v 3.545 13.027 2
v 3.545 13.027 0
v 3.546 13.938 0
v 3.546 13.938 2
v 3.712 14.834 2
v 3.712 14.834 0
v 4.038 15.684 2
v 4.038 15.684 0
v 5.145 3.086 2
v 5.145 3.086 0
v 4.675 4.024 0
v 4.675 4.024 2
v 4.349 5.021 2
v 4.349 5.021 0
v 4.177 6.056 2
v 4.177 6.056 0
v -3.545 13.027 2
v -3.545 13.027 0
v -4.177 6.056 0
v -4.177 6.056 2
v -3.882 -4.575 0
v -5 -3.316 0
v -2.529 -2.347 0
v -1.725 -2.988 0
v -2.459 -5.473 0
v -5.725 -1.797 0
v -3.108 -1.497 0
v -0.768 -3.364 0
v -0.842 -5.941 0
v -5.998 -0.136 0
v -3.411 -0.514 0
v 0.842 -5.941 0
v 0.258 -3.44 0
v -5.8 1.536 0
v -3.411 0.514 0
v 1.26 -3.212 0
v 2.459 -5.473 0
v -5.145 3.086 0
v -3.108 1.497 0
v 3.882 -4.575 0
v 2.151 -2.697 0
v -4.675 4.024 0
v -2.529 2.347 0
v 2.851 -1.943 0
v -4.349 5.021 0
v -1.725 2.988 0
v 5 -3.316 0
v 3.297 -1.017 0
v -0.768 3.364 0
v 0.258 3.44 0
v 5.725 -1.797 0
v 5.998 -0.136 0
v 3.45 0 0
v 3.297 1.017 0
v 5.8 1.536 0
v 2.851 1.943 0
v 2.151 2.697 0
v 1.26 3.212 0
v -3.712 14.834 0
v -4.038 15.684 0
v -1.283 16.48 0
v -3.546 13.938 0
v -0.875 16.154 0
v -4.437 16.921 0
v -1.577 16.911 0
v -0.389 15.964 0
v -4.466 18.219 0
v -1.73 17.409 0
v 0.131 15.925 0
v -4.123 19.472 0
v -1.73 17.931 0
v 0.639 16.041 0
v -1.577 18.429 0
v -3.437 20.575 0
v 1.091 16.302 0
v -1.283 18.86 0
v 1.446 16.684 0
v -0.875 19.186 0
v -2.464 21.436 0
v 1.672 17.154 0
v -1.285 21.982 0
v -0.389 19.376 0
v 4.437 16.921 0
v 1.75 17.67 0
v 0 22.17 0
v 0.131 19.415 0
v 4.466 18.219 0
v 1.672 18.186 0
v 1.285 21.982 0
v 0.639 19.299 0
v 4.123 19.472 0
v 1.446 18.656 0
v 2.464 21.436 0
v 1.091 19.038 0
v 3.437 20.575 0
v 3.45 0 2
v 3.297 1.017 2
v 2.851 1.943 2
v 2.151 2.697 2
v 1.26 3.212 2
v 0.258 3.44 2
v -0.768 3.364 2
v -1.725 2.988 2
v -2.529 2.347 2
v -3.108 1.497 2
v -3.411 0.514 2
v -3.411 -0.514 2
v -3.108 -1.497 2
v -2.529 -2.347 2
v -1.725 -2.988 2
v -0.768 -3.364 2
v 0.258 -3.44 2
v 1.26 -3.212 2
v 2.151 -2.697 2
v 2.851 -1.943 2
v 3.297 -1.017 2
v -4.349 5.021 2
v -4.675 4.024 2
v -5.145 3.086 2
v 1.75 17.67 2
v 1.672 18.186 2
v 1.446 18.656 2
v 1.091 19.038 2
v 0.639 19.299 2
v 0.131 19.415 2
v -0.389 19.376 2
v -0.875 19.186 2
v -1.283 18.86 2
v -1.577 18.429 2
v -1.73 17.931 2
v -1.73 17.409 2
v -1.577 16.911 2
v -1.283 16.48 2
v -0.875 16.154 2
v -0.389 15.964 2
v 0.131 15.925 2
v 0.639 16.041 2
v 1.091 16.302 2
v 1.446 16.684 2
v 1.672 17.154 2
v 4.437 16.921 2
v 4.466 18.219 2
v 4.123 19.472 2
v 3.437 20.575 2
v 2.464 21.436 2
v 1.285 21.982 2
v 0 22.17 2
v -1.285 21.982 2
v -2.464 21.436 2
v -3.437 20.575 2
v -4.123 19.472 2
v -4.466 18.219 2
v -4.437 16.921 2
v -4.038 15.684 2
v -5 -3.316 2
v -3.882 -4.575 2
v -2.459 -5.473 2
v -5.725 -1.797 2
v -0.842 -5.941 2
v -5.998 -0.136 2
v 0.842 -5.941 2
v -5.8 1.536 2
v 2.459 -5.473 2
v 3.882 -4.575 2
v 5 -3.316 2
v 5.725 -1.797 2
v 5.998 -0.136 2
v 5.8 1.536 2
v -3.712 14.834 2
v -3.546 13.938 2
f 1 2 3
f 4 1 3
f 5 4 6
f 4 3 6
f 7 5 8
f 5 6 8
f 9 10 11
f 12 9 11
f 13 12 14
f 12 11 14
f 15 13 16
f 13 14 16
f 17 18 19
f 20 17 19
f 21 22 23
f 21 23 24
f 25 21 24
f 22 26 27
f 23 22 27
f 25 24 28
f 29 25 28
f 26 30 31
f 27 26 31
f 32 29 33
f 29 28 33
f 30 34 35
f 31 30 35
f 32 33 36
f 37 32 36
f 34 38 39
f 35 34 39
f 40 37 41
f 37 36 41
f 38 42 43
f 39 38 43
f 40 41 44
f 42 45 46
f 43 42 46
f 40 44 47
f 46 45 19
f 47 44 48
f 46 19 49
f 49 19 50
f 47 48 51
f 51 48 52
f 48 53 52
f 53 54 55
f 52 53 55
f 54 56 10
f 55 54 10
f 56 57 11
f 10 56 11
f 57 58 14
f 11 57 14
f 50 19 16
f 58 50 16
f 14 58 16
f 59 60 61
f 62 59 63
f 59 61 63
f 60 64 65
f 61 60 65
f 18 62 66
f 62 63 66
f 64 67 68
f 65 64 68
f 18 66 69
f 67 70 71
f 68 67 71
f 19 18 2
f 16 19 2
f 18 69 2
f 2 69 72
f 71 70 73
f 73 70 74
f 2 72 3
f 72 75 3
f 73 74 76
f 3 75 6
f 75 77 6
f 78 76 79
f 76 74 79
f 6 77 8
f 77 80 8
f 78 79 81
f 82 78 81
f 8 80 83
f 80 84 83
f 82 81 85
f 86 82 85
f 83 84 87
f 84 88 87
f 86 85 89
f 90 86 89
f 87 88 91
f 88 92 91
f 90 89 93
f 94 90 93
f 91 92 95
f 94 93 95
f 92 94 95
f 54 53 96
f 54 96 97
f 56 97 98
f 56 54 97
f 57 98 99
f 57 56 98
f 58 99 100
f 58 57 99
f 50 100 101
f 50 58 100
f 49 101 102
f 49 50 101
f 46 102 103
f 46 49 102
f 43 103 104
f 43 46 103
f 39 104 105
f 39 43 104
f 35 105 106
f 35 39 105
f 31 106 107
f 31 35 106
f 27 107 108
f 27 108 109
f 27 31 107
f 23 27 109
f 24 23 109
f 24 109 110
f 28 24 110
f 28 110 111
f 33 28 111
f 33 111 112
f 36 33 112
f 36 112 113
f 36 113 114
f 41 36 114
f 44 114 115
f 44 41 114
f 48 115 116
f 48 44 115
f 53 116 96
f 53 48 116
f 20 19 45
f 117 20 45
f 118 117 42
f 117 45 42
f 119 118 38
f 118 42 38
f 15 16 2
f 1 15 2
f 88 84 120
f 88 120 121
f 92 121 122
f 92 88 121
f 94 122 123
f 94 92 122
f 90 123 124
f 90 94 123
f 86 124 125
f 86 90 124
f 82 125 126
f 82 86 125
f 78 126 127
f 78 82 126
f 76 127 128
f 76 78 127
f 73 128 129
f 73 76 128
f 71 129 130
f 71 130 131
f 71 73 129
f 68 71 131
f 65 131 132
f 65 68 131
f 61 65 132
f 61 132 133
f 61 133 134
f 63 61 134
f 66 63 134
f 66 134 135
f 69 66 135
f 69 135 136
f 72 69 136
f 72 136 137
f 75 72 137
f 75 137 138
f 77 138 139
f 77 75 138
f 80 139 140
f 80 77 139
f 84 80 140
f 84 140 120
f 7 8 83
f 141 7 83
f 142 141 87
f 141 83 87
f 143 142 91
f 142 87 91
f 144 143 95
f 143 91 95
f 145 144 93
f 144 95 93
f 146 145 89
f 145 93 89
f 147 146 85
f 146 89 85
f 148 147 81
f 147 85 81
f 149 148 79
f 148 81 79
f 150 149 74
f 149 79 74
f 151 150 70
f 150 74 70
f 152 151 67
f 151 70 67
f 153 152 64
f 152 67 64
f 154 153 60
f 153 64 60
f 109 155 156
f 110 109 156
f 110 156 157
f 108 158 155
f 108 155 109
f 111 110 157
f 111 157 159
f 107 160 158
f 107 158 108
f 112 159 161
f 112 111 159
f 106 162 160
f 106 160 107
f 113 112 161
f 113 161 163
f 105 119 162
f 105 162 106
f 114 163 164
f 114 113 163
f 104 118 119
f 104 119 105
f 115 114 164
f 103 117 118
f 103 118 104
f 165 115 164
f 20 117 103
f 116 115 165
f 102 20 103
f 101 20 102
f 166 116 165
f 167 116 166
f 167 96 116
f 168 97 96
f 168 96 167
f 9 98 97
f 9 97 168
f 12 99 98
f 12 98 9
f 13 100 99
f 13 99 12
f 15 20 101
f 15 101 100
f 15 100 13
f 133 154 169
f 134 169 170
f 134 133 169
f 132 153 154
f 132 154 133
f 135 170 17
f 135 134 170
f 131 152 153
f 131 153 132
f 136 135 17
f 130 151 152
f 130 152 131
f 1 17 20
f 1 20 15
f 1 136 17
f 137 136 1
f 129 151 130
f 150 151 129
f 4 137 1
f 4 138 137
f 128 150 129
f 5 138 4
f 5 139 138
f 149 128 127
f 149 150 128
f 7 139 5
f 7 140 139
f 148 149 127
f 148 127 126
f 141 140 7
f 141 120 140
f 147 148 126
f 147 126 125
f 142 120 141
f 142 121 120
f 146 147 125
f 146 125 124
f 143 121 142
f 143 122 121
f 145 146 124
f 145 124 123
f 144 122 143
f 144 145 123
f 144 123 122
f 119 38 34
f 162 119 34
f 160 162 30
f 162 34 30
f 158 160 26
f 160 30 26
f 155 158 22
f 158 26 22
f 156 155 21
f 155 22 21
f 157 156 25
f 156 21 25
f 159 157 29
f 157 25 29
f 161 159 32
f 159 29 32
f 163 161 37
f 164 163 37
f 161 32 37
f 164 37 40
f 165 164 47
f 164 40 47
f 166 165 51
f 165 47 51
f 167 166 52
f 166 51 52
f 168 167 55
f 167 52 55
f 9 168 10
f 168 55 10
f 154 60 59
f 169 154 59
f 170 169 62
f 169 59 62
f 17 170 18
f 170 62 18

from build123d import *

# Parameters (mm, degrees)
SKETCH1_R           = 1.75
SKETCH1_R_2         = 3.45
BOSS_EXTRUDE1_DEPTH = 2


with BuildPart() as part:
    # Sketch1 → Boss-Extrude1 (new body)
    with BuildSketch(Plane.XY):
        with BuildLine():
            Line((-3.545417743, 13.027011553), (-4.176634672, 6.056009592))
            ThreePointArc((-4.176634672, 6.056009592), (-4.493207513, 4.516501974), (-5.145282945, 3.086432151))
            ThreePointArc((-5.145282945, 3.086432151), (0, -6), (5.145282945, 3.086432151))
            ThreePointArc((5.145282945, 3.086432151), (4.493207513, 4.516501974), (4.176634672, 6.056009592))
            Line((4.176634672, 6.056009592), (3.545417743, 13.027011553))
            ThreePointArc((3.545417743, 13.027011553), (3.608859175, 14.389566924), (4.038179283, 15.684273917))
            ThreePointArc((4.038179283, 15.684273917), (0, 22.17), (-4.038179283, 15.684273917))
            ThreePointArc((-4.038179283, 15.684273917), (-3.608859175, 14.389566924), (-3.545417743, 13.027011553))
        make_face()
        with Locations((0, 17.67)):
            Circle(SKETCH1_R, mode=Mode.SUBTRACT)
        Circle(SKETCH1_R_2, mode=Mode.SUBTRACT)
    extrude(amount=BOSS_EXTRUDE1_DEPTH)


solid = part.part
